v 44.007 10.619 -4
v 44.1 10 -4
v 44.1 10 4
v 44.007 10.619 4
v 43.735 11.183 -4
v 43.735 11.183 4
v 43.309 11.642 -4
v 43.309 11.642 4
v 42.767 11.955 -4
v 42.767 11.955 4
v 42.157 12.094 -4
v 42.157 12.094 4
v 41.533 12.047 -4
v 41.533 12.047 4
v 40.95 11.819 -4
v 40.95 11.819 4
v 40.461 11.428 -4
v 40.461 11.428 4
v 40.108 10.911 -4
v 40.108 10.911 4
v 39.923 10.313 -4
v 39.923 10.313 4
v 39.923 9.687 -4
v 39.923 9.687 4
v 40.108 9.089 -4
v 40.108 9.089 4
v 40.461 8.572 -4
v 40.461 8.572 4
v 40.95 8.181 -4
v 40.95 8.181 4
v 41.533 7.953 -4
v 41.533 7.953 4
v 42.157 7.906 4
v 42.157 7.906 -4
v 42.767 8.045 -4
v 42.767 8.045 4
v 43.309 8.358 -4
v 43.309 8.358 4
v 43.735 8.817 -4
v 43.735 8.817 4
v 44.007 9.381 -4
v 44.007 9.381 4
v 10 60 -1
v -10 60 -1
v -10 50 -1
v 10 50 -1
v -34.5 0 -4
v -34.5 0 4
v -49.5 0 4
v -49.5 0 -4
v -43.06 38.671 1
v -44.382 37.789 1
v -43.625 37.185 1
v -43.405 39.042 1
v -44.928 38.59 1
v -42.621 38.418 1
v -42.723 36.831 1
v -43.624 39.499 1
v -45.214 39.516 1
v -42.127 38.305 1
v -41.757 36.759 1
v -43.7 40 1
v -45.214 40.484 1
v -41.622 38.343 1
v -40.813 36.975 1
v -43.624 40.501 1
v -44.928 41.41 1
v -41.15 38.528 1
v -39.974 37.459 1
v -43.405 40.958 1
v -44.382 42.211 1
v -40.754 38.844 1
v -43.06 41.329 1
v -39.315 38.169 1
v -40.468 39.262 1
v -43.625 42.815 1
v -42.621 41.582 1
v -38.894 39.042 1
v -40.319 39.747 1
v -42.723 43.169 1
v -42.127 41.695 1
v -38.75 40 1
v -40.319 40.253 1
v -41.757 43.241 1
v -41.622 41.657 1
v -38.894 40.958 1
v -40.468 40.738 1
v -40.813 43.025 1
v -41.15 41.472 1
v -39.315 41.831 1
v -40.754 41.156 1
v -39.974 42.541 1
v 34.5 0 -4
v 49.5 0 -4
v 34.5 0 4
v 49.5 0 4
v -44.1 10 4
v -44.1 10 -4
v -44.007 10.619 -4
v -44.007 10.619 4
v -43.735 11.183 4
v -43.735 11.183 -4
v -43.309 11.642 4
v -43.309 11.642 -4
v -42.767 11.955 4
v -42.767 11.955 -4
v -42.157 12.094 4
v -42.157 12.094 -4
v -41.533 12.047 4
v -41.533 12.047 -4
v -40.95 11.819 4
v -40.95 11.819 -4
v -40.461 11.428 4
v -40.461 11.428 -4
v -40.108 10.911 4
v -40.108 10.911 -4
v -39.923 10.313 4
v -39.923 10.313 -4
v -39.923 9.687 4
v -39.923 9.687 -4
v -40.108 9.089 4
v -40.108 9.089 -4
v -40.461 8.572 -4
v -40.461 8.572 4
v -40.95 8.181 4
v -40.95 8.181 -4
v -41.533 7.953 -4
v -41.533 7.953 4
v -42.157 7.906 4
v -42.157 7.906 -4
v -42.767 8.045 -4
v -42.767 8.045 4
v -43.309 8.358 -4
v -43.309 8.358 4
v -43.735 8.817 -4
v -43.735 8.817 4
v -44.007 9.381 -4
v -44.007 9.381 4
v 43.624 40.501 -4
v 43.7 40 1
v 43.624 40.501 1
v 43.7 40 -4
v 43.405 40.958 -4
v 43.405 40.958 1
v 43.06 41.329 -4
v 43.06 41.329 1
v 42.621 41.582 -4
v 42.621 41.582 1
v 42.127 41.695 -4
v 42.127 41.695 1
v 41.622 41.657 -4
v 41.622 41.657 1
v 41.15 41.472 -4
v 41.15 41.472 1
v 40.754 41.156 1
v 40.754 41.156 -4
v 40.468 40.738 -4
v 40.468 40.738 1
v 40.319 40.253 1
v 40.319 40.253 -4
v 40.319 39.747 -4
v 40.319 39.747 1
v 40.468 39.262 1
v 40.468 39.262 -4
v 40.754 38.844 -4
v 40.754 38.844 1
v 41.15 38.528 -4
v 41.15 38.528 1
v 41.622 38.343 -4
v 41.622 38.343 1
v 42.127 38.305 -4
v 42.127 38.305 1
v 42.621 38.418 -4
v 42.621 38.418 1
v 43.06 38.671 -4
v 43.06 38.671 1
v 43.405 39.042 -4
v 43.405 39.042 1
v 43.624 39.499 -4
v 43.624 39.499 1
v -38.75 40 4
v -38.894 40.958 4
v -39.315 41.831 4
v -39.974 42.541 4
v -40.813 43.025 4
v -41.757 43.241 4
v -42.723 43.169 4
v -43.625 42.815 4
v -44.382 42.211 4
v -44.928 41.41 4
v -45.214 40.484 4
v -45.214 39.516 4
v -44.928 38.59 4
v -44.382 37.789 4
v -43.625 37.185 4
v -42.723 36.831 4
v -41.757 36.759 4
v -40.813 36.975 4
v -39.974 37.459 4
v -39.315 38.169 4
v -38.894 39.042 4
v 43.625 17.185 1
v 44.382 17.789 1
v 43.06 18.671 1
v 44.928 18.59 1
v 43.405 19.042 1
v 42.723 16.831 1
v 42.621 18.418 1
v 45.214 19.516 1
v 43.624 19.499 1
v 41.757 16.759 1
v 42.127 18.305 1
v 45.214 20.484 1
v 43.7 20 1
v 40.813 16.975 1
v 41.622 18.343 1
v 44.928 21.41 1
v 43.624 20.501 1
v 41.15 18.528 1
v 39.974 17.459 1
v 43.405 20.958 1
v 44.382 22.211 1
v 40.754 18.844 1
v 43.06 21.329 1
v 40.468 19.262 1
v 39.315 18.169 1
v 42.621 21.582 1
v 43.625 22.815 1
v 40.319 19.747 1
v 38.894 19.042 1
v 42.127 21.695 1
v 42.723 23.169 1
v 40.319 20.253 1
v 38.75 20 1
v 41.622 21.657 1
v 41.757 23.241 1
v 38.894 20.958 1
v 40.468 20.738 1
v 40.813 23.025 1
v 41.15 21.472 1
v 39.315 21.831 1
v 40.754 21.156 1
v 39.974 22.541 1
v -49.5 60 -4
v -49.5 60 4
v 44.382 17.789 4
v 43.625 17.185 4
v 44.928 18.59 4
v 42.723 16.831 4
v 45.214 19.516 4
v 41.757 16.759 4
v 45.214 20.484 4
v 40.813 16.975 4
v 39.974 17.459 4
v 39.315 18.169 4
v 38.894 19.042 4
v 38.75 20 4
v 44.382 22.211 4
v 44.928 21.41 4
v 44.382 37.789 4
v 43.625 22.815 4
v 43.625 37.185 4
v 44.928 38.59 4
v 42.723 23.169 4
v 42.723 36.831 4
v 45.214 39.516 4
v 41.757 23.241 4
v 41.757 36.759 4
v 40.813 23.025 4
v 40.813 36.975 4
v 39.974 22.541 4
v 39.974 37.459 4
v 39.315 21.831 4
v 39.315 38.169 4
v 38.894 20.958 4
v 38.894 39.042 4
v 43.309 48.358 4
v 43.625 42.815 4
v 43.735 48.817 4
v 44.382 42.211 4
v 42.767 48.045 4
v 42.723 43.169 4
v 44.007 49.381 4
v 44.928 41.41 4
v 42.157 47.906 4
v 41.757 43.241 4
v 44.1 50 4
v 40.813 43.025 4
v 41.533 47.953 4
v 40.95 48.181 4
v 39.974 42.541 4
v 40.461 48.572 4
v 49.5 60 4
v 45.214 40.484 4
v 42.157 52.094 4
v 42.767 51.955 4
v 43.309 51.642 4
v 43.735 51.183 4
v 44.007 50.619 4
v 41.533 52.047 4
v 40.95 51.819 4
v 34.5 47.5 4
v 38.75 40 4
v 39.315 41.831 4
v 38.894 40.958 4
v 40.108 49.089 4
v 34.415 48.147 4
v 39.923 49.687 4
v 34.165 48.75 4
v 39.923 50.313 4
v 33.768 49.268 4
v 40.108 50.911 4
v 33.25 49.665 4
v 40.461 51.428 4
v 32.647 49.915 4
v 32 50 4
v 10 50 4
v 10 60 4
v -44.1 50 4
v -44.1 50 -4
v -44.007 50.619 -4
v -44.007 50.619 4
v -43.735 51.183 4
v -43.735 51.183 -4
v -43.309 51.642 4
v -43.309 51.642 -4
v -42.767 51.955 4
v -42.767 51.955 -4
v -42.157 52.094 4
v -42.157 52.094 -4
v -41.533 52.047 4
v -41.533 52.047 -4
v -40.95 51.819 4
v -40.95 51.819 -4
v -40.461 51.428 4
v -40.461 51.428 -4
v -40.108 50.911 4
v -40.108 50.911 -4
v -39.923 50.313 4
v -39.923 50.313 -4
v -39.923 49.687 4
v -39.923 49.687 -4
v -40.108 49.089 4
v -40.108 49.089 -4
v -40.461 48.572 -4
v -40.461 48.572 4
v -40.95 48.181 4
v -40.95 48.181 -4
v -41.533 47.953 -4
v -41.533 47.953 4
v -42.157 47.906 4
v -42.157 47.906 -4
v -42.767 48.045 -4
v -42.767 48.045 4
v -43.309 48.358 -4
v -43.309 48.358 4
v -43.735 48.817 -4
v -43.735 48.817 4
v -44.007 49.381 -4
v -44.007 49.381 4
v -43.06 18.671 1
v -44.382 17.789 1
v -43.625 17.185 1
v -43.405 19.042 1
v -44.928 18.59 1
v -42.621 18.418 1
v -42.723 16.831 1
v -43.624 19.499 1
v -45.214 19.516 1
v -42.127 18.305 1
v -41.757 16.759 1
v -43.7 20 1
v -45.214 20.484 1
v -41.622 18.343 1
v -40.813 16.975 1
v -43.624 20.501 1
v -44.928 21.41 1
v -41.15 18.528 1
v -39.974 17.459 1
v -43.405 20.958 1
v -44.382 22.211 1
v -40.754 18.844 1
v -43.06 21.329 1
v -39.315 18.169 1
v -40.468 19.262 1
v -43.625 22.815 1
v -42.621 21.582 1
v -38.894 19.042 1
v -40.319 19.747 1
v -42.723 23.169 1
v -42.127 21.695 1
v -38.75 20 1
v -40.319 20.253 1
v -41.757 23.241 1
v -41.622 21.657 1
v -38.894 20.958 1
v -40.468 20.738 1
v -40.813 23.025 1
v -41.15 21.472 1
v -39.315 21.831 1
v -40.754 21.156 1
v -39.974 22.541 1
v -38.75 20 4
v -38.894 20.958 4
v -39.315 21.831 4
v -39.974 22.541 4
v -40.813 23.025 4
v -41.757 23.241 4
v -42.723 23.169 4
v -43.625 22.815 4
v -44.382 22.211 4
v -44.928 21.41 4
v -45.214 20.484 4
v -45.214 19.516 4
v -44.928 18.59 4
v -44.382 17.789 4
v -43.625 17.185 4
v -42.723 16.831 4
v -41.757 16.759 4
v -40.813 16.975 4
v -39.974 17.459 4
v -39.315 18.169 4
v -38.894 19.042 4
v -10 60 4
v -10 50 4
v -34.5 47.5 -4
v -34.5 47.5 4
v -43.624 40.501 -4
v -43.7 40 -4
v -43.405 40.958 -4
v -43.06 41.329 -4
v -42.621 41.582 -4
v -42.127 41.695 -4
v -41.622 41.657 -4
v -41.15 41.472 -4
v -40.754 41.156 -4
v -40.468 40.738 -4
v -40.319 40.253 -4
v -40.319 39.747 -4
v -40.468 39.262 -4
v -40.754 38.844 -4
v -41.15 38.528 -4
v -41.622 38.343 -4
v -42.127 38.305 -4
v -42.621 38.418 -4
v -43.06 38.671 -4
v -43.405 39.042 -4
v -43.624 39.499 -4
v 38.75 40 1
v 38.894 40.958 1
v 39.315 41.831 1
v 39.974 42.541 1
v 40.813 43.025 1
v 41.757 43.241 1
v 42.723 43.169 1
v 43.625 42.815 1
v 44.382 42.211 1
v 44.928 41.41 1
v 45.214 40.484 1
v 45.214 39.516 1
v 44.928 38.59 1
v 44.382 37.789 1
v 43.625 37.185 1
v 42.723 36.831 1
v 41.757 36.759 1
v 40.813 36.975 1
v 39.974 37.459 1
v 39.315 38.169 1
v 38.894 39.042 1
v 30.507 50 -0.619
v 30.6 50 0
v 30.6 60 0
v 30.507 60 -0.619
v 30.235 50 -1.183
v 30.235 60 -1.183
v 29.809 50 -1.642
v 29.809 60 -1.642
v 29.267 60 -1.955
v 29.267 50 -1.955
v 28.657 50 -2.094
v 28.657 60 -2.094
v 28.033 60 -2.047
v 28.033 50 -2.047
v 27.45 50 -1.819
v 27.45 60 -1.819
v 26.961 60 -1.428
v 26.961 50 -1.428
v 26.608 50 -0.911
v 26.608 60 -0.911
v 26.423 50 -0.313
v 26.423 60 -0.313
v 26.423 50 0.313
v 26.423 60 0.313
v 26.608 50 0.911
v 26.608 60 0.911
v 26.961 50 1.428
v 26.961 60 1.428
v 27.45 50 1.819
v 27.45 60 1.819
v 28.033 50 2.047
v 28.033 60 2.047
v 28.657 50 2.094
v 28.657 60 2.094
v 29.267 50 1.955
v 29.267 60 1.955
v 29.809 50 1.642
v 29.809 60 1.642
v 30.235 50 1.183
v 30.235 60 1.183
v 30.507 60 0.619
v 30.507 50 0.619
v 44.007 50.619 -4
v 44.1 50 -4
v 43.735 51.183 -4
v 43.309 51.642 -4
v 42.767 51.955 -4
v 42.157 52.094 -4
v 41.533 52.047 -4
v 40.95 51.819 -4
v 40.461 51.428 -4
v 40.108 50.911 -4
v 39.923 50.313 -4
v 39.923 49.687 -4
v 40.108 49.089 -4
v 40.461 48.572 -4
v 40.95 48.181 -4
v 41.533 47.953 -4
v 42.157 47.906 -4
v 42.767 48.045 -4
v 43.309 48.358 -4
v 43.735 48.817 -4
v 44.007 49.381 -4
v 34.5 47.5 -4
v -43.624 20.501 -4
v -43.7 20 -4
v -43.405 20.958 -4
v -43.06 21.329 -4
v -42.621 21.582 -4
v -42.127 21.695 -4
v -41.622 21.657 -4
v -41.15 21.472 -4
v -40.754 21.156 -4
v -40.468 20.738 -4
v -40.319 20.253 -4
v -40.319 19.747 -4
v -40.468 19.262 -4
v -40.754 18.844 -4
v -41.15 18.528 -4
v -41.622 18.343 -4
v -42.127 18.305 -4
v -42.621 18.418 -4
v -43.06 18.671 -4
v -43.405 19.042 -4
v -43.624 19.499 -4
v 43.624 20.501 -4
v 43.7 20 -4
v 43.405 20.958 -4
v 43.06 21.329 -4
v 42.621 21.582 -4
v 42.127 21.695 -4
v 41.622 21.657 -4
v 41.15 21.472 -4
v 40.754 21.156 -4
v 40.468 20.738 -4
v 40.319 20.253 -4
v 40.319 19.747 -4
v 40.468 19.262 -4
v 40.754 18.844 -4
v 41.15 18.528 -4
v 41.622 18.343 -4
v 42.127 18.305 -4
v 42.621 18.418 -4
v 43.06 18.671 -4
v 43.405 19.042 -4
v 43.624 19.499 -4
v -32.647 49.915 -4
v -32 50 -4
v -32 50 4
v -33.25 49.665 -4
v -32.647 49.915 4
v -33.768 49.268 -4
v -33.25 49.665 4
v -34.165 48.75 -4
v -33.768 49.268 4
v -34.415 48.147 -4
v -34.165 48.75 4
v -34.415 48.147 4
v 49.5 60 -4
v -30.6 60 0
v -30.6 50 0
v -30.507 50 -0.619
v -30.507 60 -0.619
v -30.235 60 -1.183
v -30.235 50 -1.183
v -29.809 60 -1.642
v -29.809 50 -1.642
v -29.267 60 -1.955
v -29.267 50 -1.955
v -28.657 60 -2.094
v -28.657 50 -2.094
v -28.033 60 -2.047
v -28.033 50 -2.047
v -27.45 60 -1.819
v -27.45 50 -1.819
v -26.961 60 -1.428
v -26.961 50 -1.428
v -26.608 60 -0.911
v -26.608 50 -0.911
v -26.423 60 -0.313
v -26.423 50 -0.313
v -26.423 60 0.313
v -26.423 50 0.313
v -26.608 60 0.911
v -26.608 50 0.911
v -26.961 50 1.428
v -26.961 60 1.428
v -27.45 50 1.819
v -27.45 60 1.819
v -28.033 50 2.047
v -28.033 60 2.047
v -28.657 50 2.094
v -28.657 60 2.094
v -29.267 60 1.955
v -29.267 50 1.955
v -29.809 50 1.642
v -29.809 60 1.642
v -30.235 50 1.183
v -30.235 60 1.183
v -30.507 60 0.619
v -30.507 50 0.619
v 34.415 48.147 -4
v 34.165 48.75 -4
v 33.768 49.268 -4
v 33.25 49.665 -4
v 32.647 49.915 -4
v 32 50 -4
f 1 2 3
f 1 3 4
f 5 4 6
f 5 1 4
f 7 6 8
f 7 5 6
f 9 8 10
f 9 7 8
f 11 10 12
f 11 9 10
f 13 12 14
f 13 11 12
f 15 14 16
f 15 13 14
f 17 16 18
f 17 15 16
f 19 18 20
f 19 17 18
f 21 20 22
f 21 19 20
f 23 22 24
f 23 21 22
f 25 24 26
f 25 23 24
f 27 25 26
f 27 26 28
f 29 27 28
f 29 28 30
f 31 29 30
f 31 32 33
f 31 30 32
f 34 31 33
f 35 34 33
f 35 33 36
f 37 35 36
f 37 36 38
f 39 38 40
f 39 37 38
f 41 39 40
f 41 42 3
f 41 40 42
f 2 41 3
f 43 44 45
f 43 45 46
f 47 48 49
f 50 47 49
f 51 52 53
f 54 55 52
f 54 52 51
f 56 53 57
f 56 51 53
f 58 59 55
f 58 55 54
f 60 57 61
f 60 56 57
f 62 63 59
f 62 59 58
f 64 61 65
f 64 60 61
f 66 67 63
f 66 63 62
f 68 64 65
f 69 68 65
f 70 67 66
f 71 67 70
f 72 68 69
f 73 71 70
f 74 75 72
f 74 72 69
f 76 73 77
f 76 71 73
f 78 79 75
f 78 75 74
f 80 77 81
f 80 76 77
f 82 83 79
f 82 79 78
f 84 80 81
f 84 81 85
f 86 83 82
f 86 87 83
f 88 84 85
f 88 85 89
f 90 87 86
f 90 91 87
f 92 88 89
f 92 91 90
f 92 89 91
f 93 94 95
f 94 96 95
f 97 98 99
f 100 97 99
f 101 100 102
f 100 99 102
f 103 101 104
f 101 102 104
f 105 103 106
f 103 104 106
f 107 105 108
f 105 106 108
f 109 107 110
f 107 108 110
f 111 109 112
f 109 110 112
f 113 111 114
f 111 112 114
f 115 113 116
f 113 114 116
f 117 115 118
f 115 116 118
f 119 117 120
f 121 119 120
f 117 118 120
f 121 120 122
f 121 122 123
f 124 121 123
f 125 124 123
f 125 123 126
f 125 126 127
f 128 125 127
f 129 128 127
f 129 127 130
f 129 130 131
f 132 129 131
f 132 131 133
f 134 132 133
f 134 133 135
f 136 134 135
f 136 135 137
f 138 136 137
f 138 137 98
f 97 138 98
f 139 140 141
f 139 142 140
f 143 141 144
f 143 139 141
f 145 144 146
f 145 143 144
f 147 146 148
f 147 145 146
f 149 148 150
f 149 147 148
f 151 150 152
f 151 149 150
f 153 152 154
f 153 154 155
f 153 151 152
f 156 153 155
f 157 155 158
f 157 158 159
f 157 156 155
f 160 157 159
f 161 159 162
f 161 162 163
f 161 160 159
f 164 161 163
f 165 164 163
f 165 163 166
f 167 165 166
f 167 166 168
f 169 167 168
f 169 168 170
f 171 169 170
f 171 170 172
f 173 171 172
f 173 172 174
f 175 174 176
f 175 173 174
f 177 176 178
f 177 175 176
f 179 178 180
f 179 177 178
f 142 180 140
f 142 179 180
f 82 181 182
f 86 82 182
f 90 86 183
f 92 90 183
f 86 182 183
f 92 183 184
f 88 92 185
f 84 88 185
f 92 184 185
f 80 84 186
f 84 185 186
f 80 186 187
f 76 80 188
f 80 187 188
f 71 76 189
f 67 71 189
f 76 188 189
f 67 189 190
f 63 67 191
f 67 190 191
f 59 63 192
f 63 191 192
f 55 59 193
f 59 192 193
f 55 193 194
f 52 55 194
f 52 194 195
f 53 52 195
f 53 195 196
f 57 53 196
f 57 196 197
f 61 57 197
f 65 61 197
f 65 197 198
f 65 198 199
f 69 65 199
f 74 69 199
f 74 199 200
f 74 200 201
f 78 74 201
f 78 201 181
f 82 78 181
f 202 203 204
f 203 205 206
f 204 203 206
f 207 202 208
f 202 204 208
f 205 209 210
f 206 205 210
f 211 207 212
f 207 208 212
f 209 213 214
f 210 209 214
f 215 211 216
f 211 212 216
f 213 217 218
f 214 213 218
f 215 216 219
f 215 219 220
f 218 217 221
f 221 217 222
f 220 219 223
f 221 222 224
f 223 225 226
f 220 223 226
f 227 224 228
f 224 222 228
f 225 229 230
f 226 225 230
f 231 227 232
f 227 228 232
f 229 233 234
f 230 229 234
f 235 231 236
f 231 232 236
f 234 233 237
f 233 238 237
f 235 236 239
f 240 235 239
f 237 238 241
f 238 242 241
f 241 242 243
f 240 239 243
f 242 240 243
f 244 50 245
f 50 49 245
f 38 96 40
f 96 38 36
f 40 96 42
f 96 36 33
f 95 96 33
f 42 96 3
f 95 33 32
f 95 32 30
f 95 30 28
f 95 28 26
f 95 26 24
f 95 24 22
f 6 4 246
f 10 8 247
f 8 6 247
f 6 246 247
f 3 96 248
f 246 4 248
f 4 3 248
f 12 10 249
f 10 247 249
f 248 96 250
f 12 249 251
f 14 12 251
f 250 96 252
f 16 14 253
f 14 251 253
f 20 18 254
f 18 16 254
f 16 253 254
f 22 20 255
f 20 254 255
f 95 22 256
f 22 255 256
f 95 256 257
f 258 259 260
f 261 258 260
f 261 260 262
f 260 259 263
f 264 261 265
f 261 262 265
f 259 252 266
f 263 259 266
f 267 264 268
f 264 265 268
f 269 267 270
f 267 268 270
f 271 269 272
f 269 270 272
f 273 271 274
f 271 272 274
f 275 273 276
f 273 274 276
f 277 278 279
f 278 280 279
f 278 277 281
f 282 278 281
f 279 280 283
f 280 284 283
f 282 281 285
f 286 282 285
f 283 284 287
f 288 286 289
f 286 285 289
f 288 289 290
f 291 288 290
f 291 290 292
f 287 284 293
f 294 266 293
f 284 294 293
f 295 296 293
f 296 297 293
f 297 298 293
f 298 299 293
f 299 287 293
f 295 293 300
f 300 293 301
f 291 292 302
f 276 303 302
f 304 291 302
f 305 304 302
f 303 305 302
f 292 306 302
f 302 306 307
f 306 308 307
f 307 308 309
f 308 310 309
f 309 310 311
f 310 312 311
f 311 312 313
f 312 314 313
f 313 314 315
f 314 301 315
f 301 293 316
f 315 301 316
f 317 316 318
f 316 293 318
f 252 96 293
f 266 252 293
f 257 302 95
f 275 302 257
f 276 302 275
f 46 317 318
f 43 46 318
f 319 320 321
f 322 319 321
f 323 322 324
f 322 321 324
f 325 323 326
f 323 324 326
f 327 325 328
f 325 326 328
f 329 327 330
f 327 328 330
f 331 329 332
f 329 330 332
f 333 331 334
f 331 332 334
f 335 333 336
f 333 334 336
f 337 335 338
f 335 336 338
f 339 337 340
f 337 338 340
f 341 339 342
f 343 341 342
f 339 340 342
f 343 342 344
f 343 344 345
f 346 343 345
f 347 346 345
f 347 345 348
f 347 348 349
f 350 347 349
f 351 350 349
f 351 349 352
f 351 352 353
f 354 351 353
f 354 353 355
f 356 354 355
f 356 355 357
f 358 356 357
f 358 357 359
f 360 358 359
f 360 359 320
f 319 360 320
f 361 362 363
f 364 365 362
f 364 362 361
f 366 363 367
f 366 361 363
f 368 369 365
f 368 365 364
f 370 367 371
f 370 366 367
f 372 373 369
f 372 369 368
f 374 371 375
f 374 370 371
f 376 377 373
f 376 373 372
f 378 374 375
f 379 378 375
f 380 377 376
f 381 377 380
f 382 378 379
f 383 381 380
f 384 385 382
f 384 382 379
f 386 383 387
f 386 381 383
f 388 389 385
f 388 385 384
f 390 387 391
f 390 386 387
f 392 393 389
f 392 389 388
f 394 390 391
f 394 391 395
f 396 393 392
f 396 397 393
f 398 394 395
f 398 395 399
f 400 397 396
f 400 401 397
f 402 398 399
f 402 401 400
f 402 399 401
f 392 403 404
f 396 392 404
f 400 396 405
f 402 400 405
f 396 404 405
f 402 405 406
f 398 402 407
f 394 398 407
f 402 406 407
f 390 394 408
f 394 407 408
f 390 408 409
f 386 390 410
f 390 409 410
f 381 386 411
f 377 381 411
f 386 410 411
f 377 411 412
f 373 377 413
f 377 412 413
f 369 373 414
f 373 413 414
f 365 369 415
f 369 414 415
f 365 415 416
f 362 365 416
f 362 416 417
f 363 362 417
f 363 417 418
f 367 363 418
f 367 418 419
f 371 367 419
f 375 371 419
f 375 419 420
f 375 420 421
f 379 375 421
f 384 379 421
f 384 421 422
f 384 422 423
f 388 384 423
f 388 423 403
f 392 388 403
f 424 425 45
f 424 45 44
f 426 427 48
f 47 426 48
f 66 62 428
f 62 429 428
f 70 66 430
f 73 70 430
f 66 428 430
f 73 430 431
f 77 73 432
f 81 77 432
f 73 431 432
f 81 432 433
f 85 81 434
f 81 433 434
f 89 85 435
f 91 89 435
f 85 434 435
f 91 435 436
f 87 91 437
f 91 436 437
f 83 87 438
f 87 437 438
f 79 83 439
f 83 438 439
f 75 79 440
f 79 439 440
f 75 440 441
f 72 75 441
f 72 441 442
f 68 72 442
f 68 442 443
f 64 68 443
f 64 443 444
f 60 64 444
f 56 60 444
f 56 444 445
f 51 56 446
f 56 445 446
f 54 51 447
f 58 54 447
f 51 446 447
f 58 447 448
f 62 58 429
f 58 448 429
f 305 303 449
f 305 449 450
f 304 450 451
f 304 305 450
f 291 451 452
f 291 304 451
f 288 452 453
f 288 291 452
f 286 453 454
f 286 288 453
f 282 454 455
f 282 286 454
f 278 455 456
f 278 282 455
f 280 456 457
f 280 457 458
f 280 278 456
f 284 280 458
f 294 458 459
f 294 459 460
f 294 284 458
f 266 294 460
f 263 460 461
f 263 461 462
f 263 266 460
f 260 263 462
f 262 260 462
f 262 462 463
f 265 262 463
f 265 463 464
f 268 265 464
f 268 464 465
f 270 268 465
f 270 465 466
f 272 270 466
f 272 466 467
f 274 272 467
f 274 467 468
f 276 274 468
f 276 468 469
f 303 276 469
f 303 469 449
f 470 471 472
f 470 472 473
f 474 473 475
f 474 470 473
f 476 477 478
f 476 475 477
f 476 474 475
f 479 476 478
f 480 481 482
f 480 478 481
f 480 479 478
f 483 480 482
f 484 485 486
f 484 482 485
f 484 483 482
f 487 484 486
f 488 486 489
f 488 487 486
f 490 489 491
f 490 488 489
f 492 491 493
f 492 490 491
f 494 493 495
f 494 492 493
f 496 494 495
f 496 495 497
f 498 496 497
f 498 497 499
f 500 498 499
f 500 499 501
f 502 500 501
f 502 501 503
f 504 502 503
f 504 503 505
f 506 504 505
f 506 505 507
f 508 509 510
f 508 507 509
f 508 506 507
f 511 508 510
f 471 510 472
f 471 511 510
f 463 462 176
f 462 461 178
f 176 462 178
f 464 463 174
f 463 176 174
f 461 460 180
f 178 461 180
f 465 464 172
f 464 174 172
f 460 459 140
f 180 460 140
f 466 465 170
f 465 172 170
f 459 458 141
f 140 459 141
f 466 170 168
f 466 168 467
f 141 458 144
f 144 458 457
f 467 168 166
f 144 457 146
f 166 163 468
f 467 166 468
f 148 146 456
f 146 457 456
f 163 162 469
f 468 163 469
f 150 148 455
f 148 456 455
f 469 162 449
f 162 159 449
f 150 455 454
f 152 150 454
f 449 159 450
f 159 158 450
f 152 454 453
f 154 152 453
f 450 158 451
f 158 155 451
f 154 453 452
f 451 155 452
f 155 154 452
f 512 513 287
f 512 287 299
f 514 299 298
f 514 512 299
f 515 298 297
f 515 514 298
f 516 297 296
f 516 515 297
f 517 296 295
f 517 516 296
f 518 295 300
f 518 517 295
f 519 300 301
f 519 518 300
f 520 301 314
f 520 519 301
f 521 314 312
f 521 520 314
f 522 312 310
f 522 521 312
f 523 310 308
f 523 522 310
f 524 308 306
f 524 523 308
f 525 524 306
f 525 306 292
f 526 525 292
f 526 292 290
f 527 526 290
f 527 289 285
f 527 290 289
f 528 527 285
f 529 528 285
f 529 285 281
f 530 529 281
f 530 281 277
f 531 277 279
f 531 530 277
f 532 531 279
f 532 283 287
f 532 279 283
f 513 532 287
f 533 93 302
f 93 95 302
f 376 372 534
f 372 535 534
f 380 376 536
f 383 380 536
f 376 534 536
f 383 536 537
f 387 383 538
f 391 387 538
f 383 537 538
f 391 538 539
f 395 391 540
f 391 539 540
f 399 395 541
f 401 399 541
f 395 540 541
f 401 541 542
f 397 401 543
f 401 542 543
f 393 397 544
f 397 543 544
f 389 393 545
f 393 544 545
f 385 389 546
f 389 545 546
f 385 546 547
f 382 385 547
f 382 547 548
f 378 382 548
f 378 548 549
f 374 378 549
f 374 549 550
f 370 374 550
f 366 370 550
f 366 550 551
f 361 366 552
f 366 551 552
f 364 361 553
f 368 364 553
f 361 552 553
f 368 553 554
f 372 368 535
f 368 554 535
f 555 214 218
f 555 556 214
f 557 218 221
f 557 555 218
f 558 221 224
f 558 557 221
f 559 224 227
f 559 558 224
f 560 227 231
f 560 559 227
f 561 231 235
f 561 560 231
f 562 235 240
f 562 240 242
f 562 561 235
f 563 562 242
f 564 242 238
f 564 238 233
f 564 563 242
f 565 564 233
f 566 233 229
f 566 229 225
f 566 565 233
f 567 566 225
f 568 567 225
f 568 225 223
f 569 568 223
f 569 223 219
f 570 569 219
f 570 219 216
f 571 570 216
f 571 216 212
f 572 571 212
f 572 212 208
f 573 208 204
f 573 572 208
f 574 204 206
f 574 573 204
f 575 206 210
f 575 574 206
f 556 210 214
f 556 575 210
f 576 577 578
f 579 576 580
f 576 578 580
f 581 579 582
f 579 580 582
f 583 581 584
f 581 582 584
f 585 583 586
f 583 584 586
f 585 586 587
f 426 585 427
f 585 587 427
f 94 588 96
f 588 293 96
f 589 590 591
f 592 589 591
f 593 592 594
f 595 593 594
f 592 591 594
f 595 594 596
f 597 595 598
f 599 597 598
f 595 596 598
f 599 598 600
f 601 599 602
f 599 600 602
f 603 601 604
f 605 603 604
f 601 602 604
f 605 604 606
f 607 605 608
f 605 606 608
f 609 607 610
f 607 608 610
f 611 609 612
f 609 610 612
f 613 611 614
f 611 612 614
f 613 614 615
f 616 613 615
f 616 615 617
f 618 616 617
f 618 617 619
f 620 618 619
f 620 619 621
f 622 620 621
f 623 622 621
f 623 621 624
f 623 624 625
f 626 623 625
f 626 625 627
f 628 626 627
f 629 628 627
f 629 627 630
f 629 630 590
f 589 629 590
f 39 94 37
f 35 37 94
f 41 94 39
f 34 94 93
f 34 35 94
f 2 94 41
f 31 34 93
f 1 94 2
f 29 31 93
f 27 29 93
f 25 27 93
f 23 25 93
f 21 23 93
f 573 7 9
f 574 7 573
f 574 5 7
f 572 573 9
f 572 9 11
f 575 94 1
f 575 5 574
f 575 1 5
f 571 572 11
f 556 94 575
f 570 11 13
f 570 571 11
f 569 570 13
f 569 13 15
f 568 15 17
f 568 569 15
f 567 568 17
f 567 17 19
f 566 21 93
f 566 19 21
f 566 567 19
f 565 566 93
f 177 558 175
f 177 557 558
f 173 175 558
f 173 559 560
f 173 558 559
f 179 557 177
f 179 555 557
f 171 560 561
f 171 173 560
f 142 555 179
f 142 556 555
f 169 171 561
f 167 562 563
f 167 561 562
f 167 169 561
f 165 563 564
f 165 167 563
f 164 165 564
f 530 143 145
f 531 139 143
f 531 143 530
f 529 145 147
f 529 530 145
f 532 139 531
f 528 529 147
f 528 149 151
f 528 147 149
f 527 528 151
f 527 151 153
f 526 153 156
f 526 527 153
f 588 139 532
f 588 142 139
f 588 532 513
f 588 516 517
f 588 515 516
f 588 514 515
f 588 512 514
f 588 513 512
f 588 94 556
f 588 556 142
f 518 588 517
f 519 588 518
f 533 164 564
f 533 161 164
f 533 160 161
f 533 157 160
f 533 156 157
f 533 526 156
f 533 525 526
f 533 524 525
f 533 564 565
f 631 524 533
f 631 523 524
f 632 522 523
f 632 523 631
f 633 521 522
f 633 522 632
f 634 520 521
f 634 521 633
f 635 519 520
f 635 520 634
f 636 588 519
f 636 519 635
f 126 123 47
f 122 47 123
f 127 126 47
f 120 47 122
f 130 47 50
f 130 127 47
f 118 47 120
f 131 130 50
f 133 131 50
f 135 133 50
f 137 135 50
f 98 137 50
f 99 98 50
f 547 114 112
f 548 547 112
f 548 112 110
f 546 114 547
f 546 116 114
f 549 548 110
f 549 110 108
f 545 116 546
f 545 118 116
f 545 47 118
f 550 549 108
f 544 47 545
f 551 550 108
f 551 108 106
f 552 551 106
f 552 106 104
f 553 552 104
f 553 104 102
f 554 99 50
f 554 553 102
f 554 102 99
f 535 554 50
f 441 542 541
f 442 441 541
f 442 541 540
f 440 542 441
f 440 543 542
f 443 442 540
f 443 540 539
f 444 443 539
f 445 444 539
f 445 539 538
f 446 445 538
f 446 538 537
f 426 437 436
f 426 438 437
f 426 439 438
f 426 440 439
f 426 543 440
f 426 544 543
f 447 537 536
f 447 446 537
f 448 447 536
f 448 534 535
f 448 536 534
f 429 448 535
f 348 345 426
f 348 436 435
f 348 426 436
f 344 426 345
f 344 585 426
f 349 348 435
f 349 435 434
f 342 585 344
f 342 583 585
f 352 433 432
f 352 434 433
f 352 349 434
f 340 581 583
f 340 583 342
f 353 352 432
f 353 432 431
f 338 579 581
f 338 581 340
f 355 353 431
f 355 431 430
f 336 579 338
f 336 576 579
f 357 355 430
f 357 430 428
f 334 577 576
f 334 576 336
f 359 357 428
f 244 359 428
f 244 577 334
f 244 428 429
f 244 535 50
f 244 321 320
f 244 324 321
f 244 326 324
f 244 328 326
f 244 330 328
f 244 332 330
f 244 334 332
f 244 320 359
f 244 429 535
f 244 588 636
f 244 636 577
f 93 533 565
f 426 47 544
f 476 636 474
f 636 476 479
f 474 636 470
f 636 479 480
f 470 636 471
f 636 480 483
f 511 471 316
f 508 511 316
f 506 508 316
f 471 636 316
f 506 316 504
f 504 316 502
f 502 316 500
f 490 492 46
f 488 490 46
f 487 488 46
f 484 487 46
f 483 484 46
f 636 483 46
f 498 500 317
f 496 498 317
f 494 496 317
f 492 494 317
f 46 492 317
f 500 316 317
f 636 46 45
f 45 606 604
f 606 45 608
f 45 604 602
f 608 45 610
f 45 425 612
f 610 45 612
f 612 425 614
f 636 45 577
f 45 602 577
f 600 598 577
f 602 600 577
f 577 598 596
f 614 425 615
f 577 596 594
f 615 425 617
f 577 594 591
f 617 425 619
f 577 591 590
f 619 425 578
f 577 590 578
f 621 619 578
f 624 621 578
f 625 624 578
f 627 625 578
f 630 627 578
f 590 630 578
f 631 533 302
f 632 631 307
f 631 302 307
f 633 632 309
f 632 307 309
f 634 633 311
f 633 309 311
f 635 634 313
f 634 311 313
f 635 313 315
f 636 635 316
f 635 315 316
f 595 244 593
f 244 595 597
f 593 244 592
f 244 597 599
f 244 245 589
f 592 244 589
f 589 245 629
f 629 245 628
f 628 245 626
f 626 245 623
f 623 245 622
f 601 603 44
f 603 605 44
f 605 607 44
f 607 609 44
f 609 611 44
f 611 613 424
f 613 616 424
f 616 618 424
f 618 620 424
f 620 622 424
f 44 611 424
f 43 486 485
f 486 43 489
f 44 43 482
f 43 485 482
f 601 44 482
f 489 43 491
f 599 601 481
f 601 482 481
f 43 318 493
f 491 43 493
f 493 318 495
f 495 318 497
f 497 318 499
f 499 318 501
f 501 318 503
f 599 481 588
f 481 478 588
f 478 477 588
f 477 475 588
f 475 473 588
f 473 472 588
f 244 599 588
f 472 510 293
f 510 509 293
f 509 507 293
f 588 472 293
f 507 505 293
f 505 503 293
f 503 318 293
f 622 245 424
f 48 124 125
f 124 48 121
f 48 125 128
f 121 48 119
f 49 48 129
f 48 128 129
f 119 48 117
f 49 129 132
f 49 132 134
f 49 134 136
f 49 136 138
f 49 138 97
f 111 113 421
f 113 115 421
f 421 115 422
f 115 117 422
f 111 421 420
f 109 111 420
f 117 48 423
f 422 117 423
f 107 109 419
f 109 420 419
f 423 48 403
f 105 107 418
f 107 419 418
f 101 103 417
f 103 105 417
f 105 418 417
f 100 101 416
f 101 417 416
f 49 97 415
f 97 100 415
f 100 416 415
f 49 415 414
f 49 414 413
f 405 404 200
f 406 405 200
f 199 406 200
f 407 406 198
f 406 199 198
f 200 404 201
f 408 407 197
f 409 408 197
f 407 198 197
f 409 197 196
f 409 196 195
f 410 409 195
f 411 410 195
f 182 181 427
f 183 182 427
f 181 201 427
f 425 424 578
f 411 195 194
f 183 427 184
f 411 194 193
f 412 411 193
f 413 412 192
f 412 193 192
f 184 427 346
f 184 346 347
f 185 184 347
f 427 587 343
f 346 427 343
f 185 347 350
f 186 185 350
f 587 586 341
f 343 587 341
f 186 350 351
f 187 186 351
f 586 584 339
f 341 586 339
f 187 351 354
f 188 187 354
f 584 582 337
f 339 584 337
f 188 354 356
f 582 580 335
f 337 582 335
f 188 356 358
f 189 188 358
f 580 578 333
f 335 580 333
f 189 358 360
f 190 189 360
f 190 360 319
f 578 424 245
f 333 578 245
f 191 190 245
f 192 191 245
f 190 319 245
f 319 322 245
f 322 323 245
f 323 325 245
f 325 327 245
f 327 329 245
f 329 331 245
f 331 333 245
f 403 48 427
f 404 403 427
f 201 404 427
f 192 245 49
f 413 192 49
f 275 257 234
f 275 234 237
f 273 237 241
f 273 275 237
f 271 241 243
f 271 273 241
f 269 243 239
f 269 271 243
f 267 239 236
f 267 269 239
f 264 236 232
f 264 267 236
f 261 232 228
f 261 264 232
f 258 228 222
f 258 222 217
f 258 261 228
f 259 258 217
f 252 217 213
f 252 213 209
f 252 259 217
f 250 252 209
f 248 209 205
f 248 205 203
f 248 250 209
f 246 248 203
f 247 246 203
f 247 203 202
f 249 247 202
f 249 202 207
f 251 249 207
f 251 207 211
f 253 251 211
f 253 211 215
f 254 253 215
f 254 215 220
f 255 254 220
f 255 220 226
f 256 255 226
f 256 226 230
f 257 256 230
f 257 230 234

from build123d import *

# Parameters (mm, degrees)
BOSS_EXTRUDE1_DEPTH            = 4
CBORE_FOR_M3_SHCS2_D           = 3.4
CBORE_FOR_M3_SHCS2_CBORE_D     = 6.5
CBORE_FOR_M3_SHCS2_CBORE_DEPTH = 3
M5X0_8_TAPPED_HOLE1_D          = 4.2
M5X0_8_TAPPED_HOLE2_D          = 4.2
SKETCH8_W                      = 20
SKETCH8_H                      = 10
CUT_EXTRUDE1_DEPTH             = 5


with BuildPart() as part:
    # Sketch1 → Boss-Extrude1 (new body, symmetric)
    with BuildSketch(Plane.XY):
        with BuildLine():
            Line((-34.5, 0), (-49.5, 0))
            Line((-49.5, 0), (-49.5, 60))
            Line((-49.5, 60), (49.5, 60))
            Line((49.5, 60), (49.5, 0))
            Line((49.5, 0), (34.5, 0))
            Line((34.5, 0), (34.5, 47.5))
            ThreePointArc((34.5, 47.5), (33.767766953, 49.267766953), (32, 50))
            Line((32, 50), (-32, 50))
            ThreePointArc((-32, 50), (-33.767766953, 49.267766953), (-34.5, 47.5))
            Line((-34.5, 47.5), (-34.5, 0))
        make_face()
    extrude(amount=BOSS_EXTRUDE1_DEPTH, both=True)

    # CBORE for M3 SHCS2 (through all)
    with Locations(Plane.XY.offset(4)):
        with Locations((-42, 40), (-42, 20)):
            cbore_for_m3_shcs2 = CounterBoreHole(CBORE_FOR_M3_SHCS2_D / 2, CBORE_FOR_M3_SHCS2_CBORE_D / 2, CBORE_FOR_M3_SHCS2_CBORE_DEPTH)

    # M5x0.8 Tapped Hole1 (through all)
    with Locations(Plane.XY.offset(4)):
        with Locations((-42, 10), (-42, 50)):
            m5x0_8_tapped_hole1 = Hole(M5X0_8_TAPPED_HOLE1_D / 2)

    # M5x0.8 Tapped Hole2 (through all)
    with Locations(Plane(origin=(0, 60, 0), x_dir=(1, 0, 0), z_dir=(0, 1, 0))):
        with Locations((-28.5, 0)):
            m5x0_8_tapped_hole2 = Hole(M5X0_8_TAPPED_HOLE2_D / 2)

    # Mirror1: CBORE for M3 SHCS2, M5x0.8 Tapped Hole1, M5x0.8 Tapped Hole2 across plane
    add(cbore_for_m3_shcs2.mirror(Plane(origin=(0, 0, 0), x_dir=(0, 0, 1), z_dir=(1, 0, 0))), mode=Mode.SUBTRACT)
    add(m5x0_8_tapped_hole1.mirror(Plane(origin=(0, 0, 0), x_dir=(0, 0, 1), z_dir=(1, 0, 0))), mode=Mode.SUBTRACT)
    add(m5x0_8_tapped_hole2.mirror(Plane(origin=(0, 0, 0), x_dir=(0, 0, 1), z_dir=(1, 0, 0))), mode=Mode.SUBTRACT)

    # Sketch8 → Cut-Extrude1 (cut)
    with BuildSketch(Plane.XY.offset(4)):
        with Locations((0, 55)):
            Rectangle(SKETCH8_W, SKETCH8_H)
    extrude(amount=-CUT_EXTRUDE1_DEPTH, mode=Mode.SUBTRACT)


solid = part.part
